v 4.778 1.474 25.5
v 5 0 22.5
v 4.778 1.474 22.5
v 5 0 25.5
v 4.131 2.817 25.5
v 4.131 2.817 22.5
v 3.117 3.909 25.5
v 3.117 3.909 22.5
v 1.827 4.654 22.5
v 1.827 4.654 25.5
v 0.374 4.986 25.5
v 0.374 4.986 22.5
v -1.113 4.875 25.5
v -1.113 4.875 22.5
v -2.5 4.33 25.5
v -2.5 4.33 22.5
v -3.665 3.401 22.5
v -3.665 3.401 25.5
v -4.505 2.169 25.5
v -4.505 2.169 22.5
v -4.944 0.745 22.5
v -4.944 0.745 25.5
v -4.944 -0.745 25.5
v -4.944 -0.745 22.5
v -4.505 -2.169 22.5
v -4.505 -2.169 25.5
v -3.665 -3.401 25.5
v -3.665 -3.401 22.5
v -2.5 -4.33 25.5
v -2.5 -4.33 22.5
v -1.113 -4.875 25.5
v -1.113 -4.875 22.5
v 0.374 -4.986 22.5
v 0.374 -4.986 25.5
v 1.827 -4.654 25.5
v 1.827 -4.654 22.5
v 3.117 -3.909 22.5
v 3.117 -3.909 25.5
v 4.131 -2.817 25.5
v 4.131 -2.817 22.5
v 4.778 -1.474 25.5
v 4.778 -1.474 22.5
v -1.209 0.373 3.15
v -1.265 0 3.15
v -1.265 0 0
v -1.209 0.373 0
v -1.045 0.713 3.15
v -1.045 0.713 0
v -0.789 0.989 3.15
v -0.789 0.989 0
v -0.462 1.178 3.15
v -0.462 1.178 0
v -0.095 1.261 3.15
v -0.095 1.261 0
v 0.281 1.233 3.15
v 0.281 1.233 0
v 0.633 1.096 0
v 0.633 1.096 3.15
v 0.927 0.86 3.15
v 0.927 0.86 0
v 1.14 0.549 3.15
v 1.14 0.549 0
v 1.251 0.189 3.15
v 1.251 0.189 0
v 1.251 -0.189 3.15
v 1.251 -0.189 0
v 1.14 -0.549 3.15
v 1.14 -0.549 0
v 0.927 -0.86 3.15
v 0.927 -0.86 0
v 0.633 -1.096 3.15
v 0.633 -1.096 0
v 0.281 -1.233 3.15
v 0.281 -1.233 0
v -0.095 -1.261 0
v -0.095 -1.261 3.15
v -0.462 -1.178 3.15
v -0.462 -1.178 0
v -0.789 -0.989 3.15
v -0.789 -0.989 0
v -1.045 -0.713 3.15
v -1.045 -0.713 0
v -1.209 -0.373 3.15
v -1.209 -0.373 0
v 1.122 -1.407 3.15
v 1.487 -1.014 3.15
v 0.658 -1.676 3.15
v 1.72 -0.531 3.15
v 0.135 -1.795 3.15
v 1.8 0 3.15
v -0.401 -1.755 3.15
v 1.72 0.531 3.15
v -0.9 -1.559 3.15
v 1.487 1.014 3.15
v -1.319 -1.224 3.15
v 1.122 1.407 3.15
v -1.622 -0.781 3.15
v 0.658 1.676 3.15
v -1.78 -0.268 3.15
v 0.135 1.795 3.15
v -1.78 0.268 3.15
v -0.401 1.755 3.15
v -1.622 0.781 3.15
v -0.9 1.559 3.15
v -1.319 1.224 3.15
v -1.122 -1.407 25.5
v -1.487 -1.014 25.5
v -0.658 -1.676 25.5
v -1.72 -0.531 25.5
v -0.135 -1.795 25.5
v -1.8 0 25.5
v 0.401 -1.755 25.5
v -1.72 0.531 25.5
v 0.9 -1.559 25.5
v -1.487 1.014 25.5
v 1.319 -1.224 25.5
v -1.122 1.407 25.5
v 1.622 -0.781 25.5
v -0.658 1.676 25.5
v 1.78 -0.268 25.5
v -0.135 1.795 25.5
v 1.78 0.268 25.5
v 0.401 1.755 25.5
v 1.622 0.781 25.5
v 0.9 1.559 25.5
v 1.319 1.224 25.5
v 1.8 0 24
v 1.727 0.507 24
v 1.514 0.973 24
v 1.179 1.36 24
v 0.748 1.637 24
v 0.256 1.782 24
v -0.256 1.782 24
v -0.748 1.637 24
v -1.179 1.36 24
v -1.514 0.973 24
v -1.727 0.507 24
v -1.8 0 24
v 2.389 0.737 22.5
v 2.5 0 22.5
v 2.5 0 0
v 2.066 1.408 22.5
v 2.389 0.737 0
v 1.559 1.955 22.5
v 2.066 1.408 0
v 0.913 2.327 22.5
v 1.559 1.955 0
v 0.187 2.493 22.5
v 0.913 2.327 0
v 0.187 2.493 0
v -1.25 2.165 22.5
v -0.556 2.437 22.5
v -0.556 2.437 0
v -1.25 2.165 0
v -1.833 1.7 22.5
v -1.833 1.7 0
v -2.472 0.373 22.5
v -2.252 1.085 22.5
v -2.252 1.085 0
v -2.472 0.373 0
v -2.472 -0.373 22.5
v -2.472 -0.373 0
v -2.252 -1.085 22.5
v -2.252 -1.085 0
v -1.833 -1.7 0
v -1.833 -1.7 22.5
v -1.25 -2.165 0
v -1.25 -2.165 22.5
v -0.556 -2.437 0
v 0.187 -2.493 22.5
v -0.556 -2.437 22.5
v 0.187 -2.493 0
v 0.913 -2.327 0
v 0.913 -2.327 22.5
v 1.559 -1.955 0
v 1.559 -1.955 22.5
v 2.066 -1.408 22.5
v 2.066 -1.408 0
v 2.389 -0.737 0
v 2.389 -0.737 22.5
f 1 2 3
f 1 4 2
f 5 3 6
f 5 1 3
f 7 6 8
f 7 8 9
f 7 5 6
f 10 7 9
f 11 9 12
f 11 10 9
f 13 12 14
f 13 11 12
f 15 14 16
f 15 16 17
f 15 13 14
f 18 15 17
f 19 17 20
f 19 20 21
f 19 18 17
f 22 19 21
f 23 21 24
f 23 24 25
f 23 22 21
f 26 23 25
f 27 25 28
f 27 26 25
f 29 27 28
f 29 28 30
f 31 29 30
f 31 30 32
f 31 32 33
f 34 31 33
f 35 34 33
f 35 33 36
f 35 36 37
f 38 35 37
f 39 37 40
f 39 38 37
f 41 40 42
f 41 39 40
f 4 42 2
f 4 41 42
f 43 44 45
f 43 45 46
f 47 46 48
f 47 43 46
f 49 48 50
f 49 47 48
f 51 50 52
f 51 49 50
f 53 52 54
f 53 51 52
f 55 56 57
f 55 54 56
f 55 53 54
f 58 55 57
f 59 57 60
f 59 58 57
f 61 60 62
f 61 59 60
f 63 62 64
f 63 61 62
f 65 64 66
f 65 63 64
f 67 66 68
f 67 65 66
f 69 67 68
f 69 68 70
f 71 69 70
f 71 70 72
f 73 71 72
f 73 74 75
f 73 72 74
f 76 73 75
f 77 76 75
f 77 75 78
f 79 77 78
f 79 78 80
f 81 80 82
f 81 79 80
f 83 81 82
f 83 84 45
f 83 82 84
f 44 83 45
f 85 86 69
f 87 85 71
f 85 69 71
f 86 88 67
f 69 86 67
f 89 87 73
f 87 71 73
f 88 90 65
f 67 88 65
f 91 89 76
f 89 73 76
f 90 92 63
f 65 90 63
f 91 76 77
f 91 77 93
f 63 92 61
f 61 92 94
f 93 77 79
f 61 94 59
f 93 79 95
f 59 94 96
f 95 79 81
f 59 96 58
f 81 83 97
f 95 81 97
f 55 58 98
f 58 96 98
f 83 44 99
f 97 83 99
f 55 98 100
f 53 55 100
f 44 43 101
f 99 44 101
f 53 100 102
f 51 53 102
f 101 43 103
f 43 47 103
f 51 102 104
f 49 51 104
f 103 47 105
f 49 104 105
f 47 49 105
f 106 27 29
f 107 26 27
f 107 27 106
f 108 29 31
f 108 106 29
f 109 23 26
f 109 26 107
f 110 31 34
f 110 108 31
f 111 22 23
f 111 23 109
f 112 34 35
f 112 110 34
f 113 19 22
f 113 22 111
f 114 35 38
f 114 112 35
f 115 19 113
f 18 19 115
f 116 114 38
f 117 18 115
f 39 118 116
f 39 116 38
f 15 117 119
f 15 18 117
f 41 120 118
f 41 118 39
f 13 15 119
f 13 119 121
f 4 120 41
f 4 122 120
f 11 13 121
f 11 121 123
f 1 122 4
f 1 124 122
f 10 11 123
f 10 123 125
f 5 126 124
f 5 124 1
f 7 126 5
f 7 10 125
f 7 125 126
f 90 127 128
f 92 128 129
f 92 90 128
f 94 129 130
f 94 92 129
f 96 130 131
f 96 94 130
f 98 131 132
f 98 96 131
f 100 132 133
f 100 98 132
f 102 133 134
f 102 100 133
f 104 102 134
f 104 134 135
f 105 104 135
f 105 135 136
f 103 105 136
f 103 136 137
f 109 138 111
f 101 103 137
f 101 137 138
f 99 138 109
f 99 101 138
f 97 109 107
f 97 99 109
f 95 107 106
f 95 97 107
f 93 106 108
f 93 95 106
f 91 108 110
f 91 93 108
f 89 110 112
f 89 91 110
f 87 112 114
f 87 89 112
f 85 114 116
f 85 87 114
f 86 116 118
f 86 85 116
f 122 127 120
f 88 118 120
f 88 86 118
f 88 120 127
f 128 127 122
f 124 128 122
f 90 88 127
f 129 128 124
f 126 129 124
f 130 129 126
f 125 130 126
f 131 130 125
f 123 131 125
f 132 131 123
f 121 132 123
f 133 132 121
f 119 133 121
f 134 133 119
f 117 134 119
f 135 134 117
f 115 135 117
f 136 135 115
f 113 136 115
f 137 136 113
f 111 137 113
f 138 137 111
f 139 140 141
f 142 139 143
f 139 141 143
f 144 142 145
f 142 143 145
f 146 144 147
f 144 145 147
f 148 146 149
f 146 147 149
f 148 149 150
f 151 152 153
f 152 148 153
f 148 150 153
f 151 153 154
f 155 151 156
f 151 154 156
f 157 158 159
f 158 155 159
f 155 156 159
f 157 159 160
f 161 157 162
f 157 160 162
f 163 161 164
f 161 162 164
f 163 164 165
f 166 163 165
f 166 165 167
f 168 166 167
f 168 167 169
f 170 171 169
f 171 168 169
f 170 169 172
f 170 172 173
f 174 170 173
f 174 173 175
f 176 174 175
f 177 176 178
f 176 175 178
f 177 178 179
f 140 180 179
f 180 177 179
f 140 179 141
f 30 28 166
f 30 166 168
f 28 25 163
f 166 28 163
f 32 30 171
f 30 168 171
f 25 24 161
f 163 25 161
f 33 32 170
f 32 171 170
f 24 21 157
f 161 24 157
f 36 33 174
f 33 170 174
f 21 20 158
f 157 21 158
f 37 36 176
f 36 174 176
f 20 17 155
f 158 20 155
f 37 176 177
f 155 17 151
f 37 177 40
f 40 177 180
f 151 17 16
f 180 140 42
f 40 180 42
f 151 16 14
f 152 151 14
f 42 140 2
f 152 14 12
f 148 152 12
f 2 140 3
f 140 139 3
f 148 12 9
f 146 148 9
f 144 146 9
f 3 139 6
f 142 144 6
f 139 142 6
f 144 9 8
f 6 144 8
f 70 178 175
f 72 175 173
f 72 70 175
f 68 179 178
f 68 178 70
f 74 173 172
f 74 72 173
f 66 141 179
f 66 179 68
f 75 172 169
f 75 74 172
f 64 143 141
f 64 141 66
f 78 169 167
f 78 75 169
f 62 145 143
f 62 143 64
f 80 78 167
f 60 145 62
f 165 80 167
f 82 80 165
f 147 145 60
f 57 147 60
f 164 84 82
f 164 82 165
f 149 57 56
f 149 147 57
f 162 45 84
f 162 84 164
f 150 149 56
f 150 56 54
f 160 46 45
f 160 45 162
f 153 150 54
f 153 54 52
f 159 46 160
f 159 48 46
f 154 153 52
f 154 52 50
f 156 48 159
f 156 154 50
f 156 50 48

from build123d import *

# Parameters (mm, degrees)
CROQUIS1_R                 = 2.5
CROQUIS1_R_2               = 1.8
SALIENTE_EXTRUIR1_DEPTH    = 24
CROQUIS3_R                 = 1.8
SALIENTE_EXTRUIR2_DEPTH    = 3.15
CORTAR_EXTRUIR1_DEPTH      = 25.259018941
CORTAR_EXTRUIR1_DEPTH_BACK = 25.259018941
CROQUIS4_R                 = 1.265
CROQUIS5_R                 = 5
CROQUIS5_R_2               = 1.8
SALIENTE_EXTRUIR3_DEPTH    = 1.5


with BuildPart() as part:
    # Croquis1 → Saliente-Extruir1 (new body)
    with BuildSketch(Plane.XY):
        Circle(CROQUIS1_R)
        Circle(CROQUIS1_R_2, mode=Mode.SUBTRACT)
    extrude(amount=SALIENTE_EXTRUIR1_DEPTH)

    # Croquis3 → Saliente-Extruir2 (add)
    with BuildSketch(Plane(origin=(0, 0, 0), x_dir=(-1, 0, 0), z_dir=(0, 0, -1))):
        Circle(CROQUIS3_R)
    extrude(amount=-SALIENTE_EXTRUIR2_DEPTH)

    # Croquis4 → Cortar-Extruir1 (cut, two sides: drawn at the far end of the back side and taken through both)
    with BuildSketch(Plane(origin=(0, 0, 0), x_dir=(-1, 0, 0), z_dir=(0, 0, -1)).offset(-CORTAR_EXTRUIR1_DEPTH_BACK)):
        Circle(CROQUIS4_R)
    extrude(amount=CORTAR_EXTRUIR1_DEPTH + CORTAR_EXTRUIR1_DEPTH_BACK, mode=Mode.SUBTRACT)

    # Croquis5 → Saliente-Extruir3 (add, symmetric)
    with BuildSketch(Plane.XY.offset(24)):
        Circle(CROQUIS5_R)
        with Locations(Location((0, 0, 0), (0, 0, 180))):
            Circle(CROQUIS5_R_2, mode=Mode.SUBTRACT)
    extrude(amount=SALIENTE_EXTRUIR3_DEPTH, both=True)


solid = part.part
